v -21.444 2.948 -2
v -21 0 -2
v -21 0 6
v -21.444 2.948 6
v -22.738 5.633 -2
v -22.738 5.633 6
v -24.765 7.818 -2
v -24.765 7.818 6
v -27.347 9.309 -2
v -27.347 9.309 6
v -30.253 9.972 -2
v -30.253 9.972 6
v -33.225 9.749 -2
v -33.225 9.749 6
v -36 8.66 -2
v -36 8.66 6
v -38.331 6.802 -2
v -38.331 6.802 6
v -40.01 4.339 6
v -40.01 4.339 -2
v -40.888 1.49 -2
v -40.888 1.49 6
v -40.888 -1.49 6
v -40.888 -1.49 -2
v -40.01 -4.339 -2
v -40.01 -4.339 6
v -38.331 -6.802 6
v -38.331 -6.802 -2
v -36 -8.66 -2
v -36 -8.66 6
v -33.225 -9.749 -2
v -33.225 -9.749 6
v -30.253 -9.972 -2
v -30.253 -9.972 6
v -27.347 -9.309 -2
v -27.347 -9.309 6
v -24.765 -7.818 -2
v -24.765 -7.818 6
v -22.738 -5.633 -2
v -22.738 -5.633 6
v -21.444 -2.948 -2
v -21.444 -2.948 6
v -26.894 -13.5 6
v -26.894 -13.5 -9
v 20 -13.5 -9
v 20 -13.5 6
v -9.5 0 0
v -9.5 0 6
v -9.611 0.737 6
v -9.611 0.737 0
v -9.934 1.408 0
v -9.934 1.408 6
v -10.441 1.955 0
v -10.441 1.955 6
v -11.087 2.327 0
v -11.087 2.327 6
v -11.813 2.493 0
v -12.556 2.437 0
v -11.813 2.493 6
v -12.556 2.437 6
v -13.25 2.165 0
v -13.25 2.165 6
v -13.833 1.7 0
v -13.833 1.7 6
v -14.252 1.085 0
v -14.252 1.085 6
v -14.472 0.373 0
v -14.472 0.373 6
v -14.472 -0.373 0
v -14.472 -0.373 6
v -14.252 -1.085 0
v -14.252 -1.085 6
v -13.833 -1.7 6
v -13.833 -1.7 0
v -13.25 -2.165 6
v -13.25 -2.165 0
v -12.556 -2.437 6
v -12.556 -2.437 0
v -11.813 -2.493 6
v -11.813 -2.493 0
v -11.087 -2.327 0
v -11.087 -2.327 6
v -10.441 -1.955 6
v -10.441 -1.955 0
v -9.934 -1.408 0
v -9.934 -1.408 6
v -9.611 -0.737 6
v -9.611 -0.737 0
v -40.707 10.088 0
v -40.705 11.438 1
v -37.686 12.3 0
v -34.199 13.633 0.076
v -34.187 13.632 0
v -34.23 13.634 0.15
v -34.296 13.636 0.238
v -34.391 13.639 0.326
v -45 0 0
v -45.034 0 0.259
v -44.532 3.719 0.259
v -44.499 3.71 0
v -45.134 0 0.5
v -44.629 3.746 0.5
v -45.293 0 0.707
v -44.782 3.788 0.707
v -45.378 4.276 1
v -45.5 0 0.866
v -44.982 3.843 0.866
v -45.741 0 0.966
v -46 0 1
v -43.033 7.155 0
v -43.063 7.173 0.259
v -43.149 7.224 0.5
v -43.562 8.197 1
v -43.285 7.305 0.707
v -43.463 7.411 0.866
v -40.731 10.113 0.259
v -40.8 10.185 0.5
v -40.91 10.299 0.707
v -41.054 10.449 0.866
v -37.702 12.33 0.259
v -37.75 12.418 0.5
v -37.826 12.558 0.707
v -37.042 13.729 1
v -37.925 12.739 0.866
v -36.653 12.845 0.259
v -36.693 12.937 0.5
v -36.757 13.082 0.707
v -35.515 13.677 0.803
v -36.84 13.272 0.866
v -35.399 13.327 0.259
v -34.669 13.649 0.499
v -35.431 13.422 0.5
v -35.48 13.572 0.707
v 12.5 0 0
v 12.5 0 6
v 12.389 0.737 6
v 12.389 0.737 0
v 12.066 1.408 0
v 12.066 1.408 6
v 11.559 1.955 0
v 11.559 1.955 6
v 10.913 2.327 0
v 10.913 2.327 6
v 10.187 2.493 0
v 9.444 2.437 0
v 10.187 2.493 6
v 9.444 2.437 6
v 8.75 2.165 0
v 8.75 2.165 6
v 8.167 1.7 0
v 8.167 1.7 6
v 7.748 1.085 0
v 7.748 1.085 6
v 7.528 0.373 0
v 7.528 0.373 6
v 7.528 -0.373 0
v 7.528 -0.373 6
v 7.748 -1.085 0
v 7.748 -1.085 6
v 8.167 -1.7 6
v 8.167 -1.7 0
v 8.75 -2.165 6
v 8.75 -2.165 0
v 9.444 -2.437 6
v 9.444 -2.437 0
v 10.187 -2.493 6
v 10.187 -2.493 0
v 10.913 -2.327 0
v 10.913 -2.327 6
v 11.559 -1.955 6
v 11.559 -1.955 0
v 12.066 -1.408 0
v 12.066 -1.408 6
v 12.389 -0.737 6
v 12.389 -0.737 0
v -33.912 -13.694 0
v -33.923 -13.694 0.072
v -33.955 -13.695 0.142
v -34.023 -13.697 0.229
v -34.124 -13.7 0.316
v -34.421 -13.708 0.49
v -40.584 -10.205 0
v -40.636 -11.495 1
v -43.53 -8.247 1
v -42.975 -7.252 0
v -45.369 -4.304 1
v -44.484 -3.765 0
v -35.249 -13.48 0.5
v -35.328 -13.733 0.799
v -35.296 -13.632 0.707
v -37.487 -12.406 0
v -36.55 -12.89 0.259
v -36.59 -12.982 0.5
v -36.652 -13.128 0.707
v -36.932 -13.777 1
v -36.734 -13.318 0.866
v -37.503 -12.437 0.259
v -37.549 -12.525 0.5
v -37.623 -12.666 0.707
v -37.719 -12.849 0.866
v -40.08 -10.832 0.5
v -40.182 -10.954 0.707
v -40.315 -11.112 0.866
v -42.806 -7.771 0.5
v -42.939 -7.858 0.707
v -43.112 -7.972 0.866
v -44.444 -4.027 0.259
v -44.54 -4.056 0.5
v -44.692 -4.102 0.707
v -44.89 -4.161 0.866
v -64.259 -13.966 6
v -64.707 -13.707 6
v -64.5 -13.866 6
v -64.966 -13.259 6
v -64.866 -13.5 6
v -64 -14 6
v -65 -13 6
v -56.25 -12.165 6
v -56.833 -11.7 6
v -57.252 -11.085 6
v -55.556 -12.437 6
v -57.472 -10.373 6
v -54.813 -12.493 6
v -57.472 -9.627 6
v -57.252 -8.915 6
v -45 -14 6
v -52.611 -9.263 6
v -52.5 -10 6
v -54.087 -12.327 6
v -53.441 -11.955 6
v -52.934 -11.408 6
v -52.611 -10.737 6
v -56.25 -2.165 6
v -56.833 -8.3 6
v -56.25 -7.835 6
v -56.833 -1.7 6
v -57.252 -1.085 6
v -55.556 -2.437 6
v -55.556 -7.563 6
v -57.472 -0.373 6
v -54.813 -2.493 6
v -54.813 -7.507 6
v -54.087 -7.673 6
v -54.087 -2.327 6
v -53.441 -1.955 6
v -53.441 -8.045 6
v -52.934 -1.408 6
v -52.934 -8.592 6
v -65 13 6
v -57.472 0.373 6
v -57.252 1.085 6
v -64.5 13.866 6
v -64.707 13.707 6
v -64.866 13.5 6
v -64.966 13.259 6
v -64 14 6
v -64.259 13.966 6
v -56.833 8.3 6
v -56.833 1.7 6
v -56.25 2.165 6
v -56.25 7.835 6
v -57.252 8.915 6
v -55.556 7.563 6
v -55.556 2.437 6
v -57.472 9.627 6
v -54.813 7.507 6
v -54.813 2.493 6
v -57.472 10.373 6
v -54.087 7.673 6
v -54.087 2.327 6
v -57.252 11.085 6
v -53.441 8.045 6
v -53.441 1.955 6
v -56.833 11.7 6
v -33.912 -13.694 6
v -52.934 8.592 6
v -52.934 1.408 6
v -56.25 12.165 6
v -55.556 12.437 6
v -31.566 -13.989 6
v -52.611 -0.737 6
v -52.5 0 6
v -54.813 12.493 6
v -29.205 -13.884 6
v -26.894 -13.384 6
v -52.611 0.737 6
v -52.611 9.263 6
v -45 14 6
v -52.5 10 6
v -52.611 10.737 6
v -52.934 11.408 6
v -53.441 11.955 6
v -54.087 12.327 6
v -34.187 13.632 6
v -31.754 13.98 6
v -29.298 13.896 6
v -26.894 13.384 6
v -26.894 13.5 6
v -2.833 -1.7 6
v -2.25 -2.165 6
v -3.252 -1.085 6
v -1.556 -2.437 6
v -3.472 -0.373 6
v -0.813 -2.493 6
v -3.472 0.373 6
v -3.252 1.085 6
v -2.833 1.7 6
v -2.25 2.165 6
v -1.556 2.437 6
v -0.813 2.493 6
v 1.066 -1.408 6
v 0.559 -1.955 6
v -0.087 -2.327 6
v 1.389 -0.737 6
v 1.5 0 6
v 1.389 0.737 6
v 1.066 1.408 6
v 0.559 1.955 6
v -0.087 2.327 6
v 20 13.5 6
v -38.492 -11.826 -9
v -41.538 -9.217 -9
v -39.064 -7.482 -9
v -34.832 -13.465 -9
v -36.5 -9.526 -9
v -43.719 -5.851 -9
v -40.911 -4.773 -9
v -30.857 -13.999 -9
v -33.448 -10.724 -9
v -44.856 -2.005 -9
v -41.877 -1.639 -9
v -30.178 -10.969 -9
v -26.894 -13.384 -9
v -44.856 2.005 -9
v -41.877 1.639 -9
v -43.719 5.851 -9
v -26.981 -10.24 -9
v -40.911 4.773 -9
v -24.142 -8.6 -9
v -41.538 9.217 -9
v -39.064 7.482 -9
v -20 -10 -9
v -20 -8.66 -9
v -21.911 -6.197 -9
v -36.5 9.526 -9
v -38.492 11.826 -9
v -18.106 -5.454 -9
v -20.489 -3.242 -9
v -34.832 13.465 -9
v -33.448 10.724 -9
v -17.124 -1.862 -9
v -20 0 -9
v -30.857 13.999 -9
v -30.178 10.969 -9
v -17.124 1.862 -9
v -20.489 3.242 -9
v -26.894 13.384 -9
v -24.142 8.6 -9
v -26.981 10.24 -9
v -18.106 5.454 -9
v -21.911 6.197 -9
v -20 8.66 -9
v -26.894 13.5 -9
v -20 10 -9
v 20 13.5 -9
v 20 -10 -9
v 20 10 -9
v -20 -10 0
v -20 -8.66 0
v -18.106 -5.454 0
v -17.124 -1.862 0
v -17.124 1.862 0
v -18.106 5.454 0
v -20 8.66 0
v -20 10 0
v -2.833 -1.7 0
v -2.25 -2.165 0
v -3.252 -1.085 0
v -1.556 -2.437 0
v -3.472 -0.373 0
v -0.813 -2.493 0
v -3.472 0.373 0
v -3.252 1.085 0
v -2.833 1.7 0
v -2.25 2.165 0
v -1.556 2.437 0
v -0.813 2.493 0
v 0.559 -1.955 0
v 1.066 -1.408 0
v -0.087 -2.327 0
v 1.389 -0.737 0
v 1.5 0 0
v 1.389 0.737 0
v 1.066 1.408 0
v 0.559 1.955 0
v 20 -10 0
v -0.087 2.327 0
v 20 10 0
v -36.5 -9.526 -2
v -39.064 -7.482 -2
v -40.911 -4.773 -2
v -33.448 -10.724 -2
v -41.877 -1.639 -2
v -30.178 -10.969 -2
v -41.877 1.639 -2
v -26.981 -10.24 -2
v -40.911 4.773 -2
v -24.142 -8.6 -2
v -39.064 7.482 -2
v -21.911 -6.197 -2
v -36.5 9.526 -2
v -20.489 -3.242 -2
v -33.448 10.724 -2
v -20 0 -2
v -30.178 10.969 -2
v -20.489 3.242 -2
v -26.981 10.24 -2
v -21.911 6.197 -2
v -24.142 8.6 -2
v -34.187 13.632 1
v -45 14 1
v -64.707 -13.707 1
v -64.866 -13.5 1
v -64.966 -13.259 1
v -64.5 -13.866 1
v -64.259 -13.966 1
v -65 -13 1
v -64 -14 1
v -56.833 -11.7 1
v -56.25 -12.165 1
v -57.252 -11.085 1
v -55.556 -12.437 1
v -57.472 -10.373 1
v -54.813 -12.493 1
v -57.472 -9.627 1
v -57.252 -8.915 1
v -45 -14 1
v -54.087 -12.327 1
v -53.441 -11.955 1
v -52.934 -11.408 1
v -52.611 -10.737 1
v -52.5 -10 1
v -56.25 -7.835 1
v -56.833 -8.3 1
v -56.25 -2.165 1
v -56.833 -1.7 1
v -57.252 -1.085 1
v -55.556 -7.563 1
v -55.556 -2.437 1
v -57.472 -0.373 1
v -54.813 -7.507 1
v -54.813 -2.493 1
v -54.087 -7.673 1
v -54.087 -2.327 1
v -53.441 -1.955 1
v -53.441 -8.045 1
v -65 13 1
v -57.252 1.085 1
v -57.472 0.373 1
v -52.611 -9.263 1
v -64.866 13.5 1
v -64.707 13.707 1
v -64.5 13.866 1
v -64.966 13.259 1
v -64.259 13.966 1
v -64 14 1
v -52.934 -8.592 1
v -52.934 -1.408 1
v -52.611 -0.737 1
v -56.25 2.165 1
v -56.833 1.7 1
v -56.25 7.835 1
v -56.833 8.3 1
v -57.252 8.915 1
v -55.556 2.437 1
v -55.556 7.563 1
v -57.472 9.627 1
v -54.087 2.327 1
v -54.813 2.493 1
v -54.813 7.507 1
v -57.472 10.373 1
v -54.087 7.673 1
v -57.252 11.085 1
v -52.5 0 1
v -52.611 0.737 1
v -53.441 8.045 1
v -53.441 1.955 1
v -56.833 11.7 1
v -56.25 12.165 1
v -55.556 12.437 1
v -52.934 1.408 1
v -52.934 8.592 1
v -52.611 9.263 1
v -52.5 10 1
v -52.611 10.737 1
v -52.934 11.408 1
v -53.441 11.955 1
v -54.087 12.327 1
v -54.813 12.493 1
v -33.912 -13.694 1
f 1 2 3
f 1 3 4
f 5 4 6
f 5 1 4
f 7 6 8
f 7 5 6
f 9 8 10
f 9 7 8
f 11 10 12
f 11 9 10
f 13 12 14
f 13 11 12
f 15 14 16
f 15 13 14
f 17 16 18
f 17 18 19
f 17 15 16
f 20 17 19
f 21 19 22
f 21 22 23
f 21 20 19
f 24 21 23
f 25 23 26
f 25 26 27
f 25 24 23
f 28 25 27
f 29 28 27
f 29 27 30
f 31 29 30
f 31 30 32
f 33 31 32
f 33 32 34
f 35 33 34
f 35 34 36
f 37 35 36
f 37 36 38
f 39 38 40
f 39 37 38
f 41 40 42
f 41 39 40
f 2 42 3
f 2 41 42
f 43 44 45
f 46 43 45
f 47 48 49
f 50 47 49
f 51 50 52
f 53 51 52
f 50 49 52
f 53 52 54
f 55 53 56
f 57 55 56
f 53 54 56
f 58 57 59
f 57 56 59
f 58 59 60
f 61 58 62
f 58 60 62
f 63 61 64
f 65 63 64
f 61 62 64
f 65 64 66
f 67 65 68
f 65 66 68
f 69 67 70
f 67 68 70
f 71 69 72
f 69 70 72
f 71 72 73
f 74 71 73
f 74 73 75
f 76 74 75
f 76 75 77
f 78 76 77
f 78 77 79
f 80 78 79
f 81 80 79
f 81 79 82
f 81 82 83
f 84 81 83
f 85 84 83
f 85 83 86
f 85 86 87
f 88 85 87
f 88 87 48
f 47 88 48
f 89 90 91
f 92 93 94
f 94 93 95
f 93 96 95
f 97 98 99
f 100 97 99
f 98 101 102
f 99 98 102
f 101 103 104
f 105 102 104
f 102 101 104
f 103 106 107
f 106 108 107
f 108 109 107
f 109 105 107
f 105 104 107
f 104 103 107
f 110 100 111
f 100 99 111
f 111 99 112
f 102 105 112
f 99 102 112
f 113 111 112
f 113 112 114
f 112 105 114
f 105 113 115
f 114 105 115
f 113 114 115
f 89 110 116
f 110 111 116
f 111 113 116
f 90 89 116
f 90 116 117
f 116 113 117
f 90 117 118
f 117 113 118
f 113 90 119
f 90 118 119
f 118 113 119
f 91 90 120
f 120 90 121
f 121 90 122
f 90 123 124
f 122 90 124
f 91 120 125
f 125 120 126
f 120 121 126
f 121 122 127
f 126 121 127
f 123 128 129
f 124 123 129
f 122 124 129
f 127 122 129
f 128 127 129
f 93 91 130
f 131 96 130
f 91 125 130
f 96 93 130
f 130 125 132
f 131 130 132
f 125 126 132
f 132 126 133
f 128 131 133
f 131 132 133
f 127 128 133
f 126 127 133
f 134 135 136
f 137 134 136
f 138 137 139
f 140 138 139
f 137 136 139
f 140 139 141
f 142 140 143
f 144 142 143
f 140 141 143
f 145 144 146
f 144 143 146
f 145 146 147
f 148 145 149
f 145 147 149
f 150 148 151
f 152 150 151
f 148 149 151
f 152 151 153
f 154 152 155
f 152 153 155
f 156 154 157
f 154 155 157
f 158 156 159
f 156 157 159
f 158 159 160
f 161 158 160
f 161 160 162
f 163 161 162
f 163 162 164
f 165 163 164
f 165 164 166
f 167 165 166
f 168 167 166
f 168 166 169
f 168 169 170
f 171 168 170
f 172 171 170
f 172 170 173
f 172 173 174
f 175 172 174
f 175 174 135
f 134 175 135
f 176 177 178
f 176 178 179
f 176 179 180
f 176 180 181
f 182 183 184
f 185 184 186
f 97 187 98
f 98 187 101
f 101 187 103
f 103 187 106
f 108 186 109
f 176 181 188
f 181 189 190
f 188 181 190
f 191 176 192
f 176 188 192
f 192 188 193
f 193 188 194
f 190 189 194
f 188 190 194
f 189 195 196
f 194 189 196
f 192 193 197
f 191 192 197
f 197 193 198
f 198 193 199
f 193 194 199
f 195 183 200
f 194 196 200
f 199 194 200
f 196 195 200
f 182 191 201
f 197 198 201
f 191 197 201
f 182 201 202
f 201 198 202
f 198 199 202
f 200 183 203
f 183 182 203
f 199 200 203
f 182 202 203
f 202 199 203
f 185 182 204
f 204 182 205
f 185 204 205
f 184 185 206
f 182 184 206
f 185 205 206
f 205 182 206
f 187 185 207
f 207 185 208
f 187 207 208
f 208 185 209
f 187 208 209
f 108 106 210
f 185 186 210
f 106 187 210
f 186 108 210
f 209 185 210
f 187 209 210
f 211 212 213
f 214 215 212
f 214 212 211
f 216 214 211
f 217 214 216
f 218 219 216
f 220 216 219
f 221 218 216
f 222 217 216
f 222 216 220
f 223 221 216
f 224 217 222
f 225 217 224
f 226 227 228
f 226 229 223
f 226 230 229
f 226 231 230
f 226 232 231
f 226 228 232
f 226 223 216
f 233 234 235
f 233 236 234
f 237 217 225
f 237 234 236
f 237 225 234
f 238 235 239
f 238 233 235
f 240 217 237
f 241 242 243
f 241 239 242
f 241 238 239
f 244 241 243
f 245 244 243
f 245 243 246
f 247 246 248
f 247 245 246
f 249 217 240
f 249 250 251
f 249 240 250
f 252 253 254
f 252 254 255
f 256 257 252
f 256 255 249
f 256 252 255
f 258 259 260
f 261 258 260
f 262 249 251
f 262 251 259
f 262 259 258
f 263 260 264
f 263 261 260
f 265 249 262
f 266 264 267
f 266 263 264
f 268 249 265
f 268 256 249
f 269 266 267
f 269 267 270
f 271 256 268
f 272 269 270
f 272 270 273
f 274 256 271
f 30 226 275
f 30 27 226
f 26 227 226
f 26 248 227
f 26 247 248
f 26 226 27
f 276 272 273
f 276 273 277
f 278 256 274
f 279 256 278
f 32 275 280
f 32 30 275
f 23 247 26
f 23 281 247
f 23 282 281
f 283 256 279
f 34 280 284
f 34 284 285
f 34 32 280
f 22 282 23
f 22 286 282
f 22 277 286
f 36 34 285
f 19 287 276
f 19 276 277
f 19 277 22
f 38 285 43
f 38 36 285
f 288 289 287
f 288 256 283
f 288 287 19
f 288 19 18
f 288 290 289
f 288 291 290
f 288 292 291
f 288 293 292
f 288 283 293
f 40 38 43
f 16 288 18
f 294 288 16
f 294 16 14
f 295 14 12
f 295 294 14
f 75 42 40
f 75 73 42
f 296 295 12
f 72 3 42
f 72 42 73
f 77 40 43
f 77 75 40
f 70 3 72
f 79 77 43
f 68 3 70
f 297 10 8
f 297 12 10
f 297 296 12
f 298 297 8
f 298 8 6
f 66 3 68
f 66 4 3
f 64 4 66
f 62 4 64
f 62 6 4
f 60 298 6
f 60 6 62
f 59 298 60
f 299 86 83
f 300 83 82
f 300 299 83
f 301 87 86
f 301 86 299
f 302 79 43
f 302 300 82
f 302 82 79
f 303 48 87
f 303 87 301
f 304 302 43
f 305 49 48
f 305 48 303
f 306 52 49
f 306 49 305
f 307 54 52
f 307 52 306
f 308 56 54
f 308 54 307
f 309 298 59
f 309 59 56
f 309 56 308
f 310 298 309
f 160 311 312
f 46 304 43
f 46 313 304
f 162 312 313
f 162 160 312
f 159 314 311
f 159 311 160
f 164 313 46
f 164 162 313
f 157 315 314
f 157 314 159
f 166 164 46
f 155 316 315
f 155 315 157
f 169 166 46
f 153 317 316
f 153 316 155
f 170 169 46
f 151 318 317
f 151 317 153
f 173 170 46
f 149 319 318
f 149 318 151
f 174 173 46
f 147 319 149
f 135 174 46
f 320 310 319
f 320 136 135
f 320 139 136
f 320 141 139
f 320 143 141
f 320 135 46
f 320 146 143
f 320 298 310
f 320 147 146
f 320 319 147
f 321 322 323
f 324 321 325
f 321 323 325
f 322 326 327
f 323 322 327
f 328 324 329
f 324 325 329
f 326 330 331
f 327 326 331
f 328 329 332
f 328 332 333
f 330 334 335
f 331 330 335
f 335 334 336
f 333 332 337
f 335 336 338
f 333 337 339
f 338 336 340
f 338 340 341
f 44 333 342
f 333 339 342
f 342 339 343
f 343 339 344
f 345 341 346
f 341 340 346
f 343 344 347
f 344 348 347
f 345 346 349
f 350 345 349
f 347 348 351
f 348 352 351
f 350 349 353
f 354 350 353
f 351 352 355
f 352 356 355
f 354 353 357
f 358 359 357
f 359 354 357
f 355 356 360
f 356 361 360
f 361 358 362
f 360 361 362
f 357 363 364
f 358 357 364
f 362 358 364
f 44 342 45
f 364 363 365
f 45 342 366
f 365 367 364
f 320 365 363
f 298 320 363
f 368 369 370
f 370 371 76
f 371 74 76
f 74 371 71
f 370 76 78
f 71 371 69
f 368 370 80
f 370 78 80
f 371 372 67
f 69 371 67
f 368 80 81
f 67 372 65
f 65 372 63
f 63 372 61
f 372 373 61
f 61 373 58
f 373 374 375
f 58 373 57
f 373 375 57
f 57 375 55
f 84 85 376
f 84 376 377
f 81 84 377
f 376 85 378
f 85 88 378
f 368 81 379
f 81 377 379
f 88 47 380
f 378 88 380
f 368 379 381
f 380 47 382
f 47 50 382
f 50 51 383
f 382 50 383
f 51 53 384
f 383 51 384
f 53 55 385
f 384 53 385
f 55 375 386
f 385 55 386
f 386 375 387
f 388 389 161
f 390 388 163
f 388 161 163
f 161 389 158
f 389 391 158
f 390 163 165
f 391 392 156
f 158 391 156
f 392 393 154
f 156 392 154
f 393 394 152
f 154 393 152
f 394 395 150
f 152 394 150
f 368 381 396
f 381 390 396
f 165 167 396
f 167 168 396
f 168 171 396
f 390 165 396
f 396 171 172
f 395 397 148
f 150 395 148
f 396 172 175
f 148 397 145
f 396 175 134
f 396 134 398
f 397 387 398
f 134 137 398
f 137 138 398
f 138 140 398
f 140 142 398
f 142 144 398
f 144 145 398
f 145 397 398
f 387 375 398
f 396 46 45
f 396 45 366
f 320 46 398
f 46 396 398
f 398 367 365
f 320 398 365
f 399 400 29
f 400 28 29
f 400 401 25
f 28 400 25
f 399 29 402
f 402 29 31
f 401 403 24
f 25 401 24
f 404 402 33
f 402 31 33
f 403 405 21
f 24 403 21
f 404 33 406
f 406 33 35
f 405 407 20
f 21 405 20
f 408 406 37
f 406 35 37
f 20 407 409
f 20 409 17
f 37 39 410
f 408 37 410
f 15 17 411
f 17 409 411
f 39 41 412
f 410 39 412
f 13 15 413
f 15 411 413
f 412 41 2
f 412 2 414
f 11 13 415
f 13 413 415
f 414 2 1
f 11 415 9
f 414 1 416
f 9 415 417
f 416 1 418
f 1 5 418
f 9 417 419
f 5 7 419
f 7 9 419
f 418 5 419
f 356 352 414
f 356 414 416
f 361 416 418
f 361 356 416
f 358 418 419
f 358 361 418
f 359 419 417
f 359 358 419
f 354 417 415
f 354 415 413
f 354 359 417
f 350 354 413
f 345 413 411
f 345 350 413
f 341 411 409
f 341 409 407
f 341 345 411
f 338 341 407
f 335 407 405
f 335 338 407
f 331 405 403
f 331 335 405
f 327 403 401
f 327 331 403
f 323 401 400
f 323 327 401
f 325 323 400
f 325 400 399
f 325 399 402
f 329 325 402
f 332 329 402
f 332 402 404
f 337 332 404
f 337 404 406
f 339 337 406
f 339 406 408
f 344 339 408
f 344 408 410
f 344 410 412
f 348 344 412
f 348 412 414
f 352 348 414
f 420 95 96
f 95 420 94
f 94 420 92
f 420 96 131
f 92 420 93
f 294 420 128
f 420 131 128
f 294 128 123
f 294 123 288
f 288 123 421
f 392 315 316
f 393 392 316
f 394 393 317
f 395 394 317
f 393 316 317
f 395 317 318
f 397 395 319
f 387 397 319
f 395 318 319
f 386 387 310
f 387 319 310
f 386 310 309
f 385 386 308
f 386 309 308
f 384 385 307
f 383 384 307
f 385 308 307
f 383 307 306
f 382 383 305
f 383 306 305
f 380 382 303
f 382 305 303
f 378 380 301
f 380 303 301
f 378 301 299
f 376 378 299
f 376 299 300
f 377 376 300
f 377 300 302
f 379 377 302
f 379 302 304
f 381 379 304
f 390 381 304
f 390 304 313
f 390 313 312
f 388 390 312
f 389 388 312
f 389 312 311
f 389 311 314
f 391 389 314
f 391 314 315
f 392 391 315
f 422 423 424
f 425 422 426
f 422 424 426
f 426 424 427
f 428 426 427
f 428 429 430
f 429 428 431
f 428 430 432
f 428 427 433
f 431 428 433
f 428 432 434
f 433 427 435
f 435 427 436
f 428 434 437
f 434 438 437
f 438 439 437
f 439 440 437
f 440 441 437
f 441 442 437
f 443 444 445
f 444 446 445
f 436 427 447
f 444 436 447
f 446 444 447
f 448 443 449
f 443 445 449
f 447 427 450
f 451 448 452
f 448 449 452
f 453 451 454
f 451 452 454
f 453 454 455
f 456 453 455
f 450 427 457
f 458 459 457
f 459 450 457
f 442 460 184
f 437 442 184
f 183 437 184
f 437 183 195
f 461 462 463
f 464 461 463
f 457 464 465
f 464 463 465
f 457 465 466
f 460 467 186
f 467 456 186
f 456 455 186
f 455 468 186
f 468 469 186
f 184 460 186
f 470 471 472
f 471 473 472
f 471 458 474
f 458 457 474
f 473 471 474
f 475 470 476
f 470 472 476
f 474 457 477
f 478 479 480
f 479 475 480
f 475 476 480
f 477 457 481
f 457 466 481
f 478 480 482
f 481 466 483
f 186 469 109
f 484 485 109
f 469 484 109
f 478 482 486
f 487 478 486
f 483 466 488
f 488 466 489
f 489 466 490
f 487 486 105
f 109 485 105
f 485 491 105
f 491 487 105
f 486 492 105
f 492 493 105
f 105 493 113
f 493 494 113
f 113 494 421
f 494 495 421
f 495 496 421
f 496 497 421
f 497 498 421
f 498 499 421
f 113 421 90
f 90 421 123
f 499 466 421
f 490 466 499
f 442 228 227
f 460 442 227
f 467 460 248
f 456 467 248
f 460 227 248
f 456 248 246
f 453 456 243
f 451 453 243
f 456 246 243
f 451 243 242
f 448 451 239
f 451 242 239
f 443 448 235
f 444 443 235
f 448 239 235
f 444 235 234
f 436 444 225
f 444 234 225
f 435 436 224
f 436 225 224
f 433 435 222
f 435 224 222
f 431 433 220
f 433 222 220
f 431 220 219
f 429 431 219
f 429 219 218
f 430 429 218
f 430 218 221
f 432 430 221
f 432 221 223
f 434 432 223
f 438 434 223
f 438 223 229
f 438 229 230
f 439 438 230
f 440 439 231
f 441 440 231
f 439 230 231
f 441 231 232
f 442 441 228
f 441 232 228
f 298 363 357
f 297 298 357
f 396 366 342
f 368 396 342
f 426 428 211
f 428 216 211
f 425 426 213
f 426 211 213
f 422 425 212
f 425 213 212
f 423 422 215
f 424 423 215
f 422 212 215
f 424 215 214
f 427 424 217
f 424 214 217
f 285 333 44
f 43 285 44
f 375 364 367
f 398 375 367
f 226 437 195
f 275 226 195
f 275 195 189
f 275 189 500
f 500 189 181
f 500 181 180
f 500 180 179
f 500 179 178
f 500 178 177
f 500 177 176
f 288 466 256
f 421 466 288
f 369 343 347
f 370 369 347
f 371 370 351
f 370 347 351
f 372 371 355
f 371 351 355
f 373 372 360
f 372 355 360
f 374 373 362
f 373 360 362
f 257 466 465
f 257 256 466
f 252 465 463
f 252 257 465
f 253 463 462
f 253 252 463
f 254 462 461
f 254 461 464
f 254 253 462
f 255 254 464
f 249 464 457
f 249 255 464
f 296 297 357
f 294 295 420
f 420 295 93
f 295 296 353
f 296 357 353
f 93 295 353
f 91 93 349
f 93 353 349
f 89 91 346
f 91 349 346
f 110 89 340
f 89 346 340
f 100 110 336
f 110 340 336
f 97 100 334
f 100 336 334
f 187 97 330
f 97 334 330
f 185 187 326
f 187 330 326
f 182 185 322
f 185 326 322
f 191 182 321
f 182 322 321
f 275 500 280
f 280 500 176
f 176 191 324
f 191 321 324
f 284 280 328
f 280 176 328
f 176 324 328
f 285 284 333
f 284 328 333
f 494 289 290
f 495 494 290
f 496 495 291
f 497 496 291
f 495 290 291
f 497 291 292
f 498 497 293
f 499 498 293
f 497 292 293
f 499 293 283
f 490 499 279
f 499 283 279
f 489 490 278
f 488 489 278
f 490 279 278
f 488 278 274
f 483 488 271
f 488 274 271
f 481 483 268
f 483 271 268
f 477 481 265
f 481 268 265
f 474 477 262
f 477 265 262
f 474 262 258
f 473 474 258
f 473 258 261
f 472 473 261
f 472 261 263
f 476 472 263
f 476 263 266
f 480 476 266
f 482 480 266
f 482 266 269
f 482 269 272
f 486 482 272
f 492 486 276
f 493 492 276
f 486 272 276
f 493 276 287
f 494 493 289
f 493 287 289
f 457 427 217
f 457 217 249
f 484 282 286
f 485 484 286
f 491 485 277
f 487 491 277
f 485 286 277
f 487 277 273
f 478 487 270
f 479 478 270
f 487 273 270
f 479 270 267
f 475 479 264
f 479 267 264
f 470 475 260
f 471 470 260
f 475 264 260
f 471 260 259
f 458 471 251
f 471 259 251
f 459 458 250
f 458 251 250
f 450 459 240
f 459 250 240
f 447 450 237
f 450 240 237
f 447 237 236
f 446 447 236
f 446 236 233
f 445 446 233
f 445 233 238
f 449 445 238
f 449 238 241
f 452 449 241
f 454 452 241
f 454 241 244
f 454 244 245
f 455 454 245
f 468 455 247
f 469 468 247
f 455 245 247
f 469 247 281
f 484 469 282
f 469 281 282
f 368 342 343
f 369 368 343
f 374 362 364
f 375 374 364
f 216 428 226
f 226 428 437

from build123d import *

# Parameters (mm, degrees)
SKETCH_1_W          = 40
SKETCH_1_H          = 20
EXTRUDE_1_DEPTH     = 6
SKETCH_2_R          = 2.5
CUT_EXTRUDE_1_DEPTH = 24.151673806
SKETCH_3_R          = 11
EXTRUDE_2_DEPTH     = 15
SKETCH_5_R          = 11
SKETCH_5_R_2        = 10
EXTRUDE_3_DEPTH     = 8
EXTRUDE_4_DEPTH     = 5
FILLET_1_R          = 1
FILLET_2_R          = 1
SKETCH_9_R          = 2.5
CUT_EXTRUDE_2_DEPTH = 5


with BuildPart() as part:
    # 草图1 → 凸台-拉伸1 (new body)
    with BuildSketch(Plane.XY):
        Rectangle(SKETCH_1_W, SKETCH_1_H)
    extrude(amount=EXTRUDE_1_DEPTH)

    # 草图2 → 切除-拉伸1 (cut, through all)
    with BuildSketch(Plane.XY.offset(6)):
        with Locations((10, 0)):
            Circle(SKETCH_2_R)
        with Locations((-1, 0)):
            Circle(SKETCH_2_R)
        with Locations((-12, 0)):
            Circle(SKETCH_2_R)
    extrude(amount=-CUT_EXTRUDE_1_DEPTH, mode=Mode.SUBTRACT)

    # 草图3 → 凸台-拉伸2 (add)
    with BuildSketch(Plane.XY.offset(6)):
        with BuildLine():
            Line((20, 10), (20, 13.5))
            Line((20, 13.5), (-26.893967141, 13.5))
            Line((-26.893967141, 13.5), (-26.893967141, 13.384337644))
            ThreePointArc((-26.893967141, 13.384337644), (-45, 0), (-26.893967141, -13.384337644))
            Line((-26.893967141, -13.384337644), (-26.893967141, -13.5))
            Line((-26.893967141, -13.5), (20, -13.5))
            Line((20, -13.5), (20, -10))
            Line((20, -10), (-20, -10))
            Line((-20, -10), (-20, -8.660254038))
            ThreePointArc((-20, -8.660254038), (-17, 0), (-20, 8.660254038))
            Line((-20, 8.660254038), (-20, 10))
            Line((-20, 10), (20, 10))
        make_face()
        with Locations((-31, 0)):
            Circle(SKETCH_3_R, mode=Mode.SUBTRACT)
    extrude(amount=-EXTRUDE_2_DEPTH)

    # 草图5 → 凸台-拉伸3 (add)
    with BuildSketch(Plane.XY.offset(6)):
        with Locations((-31, 0)):
            Circle(SKETCH_5_R)
        with Locations((-31, 0)):
            Circle(SKETCH_5_R_2, mode=Mode.SUBTRACT)
    extrude(amount=-EXTRUDE_3_DEPTH)

    # 草图8 → 凸台-拉伸4 (add)
    with BuildSketch(Plane.XY.offset(6)):
        with BuildLine():
            ThreePointArc((-33.911999365, -13.693803697), (-44.999289152, -0.141078849), (-34.187380521, 13.632336755))
            Line((-34.187380521, 13.632336755), (-45, 14))
            Line((-45, 14), (-65, 14))
            Line((-65, 14), (-65, -14))
            Line((-65, -14), (-45, -14))
            Line((-45, -14), (-33.911999365, -13.693803697))
        make_face()
    extrude(amount=-EXTRUDE_4_DEPTH)

    # 圆角1
    fillet_1_edges = [part.edges().sort_by_distance(p)[0] for p in [
        (-44.999289152, -0.141078849, 1),
    ]]
    fillet(fillet_1_edges, radius=FILLET_1_R)

    # 圆角2
    fillet_2_edges = [part.edges().sort_by_distance(p)[0] for p in [
        (-65, 14, 3.5),
        (-65, -14, 3.5),
    ]]
    fillet(fillet_2_edges, radius=FILLET_2_R)

    # 草图9 → 切除-拉伸2 (cut)
    with BuildSketch(Plane.XY.offset(6)):
        with Locations((-55, 0)):
            Circle(SKETCH_9_R)
        with Locations((-55, 10)):
            Circle(SKETCH_9_R)
        with Locations((-55, -10)):
            Circle(SKETCH_9_R)
    extrude(amount=-CUT_EXTRUDE_2_DEPTH, mode=Mode.SUBTRACT)


solid = part.part
